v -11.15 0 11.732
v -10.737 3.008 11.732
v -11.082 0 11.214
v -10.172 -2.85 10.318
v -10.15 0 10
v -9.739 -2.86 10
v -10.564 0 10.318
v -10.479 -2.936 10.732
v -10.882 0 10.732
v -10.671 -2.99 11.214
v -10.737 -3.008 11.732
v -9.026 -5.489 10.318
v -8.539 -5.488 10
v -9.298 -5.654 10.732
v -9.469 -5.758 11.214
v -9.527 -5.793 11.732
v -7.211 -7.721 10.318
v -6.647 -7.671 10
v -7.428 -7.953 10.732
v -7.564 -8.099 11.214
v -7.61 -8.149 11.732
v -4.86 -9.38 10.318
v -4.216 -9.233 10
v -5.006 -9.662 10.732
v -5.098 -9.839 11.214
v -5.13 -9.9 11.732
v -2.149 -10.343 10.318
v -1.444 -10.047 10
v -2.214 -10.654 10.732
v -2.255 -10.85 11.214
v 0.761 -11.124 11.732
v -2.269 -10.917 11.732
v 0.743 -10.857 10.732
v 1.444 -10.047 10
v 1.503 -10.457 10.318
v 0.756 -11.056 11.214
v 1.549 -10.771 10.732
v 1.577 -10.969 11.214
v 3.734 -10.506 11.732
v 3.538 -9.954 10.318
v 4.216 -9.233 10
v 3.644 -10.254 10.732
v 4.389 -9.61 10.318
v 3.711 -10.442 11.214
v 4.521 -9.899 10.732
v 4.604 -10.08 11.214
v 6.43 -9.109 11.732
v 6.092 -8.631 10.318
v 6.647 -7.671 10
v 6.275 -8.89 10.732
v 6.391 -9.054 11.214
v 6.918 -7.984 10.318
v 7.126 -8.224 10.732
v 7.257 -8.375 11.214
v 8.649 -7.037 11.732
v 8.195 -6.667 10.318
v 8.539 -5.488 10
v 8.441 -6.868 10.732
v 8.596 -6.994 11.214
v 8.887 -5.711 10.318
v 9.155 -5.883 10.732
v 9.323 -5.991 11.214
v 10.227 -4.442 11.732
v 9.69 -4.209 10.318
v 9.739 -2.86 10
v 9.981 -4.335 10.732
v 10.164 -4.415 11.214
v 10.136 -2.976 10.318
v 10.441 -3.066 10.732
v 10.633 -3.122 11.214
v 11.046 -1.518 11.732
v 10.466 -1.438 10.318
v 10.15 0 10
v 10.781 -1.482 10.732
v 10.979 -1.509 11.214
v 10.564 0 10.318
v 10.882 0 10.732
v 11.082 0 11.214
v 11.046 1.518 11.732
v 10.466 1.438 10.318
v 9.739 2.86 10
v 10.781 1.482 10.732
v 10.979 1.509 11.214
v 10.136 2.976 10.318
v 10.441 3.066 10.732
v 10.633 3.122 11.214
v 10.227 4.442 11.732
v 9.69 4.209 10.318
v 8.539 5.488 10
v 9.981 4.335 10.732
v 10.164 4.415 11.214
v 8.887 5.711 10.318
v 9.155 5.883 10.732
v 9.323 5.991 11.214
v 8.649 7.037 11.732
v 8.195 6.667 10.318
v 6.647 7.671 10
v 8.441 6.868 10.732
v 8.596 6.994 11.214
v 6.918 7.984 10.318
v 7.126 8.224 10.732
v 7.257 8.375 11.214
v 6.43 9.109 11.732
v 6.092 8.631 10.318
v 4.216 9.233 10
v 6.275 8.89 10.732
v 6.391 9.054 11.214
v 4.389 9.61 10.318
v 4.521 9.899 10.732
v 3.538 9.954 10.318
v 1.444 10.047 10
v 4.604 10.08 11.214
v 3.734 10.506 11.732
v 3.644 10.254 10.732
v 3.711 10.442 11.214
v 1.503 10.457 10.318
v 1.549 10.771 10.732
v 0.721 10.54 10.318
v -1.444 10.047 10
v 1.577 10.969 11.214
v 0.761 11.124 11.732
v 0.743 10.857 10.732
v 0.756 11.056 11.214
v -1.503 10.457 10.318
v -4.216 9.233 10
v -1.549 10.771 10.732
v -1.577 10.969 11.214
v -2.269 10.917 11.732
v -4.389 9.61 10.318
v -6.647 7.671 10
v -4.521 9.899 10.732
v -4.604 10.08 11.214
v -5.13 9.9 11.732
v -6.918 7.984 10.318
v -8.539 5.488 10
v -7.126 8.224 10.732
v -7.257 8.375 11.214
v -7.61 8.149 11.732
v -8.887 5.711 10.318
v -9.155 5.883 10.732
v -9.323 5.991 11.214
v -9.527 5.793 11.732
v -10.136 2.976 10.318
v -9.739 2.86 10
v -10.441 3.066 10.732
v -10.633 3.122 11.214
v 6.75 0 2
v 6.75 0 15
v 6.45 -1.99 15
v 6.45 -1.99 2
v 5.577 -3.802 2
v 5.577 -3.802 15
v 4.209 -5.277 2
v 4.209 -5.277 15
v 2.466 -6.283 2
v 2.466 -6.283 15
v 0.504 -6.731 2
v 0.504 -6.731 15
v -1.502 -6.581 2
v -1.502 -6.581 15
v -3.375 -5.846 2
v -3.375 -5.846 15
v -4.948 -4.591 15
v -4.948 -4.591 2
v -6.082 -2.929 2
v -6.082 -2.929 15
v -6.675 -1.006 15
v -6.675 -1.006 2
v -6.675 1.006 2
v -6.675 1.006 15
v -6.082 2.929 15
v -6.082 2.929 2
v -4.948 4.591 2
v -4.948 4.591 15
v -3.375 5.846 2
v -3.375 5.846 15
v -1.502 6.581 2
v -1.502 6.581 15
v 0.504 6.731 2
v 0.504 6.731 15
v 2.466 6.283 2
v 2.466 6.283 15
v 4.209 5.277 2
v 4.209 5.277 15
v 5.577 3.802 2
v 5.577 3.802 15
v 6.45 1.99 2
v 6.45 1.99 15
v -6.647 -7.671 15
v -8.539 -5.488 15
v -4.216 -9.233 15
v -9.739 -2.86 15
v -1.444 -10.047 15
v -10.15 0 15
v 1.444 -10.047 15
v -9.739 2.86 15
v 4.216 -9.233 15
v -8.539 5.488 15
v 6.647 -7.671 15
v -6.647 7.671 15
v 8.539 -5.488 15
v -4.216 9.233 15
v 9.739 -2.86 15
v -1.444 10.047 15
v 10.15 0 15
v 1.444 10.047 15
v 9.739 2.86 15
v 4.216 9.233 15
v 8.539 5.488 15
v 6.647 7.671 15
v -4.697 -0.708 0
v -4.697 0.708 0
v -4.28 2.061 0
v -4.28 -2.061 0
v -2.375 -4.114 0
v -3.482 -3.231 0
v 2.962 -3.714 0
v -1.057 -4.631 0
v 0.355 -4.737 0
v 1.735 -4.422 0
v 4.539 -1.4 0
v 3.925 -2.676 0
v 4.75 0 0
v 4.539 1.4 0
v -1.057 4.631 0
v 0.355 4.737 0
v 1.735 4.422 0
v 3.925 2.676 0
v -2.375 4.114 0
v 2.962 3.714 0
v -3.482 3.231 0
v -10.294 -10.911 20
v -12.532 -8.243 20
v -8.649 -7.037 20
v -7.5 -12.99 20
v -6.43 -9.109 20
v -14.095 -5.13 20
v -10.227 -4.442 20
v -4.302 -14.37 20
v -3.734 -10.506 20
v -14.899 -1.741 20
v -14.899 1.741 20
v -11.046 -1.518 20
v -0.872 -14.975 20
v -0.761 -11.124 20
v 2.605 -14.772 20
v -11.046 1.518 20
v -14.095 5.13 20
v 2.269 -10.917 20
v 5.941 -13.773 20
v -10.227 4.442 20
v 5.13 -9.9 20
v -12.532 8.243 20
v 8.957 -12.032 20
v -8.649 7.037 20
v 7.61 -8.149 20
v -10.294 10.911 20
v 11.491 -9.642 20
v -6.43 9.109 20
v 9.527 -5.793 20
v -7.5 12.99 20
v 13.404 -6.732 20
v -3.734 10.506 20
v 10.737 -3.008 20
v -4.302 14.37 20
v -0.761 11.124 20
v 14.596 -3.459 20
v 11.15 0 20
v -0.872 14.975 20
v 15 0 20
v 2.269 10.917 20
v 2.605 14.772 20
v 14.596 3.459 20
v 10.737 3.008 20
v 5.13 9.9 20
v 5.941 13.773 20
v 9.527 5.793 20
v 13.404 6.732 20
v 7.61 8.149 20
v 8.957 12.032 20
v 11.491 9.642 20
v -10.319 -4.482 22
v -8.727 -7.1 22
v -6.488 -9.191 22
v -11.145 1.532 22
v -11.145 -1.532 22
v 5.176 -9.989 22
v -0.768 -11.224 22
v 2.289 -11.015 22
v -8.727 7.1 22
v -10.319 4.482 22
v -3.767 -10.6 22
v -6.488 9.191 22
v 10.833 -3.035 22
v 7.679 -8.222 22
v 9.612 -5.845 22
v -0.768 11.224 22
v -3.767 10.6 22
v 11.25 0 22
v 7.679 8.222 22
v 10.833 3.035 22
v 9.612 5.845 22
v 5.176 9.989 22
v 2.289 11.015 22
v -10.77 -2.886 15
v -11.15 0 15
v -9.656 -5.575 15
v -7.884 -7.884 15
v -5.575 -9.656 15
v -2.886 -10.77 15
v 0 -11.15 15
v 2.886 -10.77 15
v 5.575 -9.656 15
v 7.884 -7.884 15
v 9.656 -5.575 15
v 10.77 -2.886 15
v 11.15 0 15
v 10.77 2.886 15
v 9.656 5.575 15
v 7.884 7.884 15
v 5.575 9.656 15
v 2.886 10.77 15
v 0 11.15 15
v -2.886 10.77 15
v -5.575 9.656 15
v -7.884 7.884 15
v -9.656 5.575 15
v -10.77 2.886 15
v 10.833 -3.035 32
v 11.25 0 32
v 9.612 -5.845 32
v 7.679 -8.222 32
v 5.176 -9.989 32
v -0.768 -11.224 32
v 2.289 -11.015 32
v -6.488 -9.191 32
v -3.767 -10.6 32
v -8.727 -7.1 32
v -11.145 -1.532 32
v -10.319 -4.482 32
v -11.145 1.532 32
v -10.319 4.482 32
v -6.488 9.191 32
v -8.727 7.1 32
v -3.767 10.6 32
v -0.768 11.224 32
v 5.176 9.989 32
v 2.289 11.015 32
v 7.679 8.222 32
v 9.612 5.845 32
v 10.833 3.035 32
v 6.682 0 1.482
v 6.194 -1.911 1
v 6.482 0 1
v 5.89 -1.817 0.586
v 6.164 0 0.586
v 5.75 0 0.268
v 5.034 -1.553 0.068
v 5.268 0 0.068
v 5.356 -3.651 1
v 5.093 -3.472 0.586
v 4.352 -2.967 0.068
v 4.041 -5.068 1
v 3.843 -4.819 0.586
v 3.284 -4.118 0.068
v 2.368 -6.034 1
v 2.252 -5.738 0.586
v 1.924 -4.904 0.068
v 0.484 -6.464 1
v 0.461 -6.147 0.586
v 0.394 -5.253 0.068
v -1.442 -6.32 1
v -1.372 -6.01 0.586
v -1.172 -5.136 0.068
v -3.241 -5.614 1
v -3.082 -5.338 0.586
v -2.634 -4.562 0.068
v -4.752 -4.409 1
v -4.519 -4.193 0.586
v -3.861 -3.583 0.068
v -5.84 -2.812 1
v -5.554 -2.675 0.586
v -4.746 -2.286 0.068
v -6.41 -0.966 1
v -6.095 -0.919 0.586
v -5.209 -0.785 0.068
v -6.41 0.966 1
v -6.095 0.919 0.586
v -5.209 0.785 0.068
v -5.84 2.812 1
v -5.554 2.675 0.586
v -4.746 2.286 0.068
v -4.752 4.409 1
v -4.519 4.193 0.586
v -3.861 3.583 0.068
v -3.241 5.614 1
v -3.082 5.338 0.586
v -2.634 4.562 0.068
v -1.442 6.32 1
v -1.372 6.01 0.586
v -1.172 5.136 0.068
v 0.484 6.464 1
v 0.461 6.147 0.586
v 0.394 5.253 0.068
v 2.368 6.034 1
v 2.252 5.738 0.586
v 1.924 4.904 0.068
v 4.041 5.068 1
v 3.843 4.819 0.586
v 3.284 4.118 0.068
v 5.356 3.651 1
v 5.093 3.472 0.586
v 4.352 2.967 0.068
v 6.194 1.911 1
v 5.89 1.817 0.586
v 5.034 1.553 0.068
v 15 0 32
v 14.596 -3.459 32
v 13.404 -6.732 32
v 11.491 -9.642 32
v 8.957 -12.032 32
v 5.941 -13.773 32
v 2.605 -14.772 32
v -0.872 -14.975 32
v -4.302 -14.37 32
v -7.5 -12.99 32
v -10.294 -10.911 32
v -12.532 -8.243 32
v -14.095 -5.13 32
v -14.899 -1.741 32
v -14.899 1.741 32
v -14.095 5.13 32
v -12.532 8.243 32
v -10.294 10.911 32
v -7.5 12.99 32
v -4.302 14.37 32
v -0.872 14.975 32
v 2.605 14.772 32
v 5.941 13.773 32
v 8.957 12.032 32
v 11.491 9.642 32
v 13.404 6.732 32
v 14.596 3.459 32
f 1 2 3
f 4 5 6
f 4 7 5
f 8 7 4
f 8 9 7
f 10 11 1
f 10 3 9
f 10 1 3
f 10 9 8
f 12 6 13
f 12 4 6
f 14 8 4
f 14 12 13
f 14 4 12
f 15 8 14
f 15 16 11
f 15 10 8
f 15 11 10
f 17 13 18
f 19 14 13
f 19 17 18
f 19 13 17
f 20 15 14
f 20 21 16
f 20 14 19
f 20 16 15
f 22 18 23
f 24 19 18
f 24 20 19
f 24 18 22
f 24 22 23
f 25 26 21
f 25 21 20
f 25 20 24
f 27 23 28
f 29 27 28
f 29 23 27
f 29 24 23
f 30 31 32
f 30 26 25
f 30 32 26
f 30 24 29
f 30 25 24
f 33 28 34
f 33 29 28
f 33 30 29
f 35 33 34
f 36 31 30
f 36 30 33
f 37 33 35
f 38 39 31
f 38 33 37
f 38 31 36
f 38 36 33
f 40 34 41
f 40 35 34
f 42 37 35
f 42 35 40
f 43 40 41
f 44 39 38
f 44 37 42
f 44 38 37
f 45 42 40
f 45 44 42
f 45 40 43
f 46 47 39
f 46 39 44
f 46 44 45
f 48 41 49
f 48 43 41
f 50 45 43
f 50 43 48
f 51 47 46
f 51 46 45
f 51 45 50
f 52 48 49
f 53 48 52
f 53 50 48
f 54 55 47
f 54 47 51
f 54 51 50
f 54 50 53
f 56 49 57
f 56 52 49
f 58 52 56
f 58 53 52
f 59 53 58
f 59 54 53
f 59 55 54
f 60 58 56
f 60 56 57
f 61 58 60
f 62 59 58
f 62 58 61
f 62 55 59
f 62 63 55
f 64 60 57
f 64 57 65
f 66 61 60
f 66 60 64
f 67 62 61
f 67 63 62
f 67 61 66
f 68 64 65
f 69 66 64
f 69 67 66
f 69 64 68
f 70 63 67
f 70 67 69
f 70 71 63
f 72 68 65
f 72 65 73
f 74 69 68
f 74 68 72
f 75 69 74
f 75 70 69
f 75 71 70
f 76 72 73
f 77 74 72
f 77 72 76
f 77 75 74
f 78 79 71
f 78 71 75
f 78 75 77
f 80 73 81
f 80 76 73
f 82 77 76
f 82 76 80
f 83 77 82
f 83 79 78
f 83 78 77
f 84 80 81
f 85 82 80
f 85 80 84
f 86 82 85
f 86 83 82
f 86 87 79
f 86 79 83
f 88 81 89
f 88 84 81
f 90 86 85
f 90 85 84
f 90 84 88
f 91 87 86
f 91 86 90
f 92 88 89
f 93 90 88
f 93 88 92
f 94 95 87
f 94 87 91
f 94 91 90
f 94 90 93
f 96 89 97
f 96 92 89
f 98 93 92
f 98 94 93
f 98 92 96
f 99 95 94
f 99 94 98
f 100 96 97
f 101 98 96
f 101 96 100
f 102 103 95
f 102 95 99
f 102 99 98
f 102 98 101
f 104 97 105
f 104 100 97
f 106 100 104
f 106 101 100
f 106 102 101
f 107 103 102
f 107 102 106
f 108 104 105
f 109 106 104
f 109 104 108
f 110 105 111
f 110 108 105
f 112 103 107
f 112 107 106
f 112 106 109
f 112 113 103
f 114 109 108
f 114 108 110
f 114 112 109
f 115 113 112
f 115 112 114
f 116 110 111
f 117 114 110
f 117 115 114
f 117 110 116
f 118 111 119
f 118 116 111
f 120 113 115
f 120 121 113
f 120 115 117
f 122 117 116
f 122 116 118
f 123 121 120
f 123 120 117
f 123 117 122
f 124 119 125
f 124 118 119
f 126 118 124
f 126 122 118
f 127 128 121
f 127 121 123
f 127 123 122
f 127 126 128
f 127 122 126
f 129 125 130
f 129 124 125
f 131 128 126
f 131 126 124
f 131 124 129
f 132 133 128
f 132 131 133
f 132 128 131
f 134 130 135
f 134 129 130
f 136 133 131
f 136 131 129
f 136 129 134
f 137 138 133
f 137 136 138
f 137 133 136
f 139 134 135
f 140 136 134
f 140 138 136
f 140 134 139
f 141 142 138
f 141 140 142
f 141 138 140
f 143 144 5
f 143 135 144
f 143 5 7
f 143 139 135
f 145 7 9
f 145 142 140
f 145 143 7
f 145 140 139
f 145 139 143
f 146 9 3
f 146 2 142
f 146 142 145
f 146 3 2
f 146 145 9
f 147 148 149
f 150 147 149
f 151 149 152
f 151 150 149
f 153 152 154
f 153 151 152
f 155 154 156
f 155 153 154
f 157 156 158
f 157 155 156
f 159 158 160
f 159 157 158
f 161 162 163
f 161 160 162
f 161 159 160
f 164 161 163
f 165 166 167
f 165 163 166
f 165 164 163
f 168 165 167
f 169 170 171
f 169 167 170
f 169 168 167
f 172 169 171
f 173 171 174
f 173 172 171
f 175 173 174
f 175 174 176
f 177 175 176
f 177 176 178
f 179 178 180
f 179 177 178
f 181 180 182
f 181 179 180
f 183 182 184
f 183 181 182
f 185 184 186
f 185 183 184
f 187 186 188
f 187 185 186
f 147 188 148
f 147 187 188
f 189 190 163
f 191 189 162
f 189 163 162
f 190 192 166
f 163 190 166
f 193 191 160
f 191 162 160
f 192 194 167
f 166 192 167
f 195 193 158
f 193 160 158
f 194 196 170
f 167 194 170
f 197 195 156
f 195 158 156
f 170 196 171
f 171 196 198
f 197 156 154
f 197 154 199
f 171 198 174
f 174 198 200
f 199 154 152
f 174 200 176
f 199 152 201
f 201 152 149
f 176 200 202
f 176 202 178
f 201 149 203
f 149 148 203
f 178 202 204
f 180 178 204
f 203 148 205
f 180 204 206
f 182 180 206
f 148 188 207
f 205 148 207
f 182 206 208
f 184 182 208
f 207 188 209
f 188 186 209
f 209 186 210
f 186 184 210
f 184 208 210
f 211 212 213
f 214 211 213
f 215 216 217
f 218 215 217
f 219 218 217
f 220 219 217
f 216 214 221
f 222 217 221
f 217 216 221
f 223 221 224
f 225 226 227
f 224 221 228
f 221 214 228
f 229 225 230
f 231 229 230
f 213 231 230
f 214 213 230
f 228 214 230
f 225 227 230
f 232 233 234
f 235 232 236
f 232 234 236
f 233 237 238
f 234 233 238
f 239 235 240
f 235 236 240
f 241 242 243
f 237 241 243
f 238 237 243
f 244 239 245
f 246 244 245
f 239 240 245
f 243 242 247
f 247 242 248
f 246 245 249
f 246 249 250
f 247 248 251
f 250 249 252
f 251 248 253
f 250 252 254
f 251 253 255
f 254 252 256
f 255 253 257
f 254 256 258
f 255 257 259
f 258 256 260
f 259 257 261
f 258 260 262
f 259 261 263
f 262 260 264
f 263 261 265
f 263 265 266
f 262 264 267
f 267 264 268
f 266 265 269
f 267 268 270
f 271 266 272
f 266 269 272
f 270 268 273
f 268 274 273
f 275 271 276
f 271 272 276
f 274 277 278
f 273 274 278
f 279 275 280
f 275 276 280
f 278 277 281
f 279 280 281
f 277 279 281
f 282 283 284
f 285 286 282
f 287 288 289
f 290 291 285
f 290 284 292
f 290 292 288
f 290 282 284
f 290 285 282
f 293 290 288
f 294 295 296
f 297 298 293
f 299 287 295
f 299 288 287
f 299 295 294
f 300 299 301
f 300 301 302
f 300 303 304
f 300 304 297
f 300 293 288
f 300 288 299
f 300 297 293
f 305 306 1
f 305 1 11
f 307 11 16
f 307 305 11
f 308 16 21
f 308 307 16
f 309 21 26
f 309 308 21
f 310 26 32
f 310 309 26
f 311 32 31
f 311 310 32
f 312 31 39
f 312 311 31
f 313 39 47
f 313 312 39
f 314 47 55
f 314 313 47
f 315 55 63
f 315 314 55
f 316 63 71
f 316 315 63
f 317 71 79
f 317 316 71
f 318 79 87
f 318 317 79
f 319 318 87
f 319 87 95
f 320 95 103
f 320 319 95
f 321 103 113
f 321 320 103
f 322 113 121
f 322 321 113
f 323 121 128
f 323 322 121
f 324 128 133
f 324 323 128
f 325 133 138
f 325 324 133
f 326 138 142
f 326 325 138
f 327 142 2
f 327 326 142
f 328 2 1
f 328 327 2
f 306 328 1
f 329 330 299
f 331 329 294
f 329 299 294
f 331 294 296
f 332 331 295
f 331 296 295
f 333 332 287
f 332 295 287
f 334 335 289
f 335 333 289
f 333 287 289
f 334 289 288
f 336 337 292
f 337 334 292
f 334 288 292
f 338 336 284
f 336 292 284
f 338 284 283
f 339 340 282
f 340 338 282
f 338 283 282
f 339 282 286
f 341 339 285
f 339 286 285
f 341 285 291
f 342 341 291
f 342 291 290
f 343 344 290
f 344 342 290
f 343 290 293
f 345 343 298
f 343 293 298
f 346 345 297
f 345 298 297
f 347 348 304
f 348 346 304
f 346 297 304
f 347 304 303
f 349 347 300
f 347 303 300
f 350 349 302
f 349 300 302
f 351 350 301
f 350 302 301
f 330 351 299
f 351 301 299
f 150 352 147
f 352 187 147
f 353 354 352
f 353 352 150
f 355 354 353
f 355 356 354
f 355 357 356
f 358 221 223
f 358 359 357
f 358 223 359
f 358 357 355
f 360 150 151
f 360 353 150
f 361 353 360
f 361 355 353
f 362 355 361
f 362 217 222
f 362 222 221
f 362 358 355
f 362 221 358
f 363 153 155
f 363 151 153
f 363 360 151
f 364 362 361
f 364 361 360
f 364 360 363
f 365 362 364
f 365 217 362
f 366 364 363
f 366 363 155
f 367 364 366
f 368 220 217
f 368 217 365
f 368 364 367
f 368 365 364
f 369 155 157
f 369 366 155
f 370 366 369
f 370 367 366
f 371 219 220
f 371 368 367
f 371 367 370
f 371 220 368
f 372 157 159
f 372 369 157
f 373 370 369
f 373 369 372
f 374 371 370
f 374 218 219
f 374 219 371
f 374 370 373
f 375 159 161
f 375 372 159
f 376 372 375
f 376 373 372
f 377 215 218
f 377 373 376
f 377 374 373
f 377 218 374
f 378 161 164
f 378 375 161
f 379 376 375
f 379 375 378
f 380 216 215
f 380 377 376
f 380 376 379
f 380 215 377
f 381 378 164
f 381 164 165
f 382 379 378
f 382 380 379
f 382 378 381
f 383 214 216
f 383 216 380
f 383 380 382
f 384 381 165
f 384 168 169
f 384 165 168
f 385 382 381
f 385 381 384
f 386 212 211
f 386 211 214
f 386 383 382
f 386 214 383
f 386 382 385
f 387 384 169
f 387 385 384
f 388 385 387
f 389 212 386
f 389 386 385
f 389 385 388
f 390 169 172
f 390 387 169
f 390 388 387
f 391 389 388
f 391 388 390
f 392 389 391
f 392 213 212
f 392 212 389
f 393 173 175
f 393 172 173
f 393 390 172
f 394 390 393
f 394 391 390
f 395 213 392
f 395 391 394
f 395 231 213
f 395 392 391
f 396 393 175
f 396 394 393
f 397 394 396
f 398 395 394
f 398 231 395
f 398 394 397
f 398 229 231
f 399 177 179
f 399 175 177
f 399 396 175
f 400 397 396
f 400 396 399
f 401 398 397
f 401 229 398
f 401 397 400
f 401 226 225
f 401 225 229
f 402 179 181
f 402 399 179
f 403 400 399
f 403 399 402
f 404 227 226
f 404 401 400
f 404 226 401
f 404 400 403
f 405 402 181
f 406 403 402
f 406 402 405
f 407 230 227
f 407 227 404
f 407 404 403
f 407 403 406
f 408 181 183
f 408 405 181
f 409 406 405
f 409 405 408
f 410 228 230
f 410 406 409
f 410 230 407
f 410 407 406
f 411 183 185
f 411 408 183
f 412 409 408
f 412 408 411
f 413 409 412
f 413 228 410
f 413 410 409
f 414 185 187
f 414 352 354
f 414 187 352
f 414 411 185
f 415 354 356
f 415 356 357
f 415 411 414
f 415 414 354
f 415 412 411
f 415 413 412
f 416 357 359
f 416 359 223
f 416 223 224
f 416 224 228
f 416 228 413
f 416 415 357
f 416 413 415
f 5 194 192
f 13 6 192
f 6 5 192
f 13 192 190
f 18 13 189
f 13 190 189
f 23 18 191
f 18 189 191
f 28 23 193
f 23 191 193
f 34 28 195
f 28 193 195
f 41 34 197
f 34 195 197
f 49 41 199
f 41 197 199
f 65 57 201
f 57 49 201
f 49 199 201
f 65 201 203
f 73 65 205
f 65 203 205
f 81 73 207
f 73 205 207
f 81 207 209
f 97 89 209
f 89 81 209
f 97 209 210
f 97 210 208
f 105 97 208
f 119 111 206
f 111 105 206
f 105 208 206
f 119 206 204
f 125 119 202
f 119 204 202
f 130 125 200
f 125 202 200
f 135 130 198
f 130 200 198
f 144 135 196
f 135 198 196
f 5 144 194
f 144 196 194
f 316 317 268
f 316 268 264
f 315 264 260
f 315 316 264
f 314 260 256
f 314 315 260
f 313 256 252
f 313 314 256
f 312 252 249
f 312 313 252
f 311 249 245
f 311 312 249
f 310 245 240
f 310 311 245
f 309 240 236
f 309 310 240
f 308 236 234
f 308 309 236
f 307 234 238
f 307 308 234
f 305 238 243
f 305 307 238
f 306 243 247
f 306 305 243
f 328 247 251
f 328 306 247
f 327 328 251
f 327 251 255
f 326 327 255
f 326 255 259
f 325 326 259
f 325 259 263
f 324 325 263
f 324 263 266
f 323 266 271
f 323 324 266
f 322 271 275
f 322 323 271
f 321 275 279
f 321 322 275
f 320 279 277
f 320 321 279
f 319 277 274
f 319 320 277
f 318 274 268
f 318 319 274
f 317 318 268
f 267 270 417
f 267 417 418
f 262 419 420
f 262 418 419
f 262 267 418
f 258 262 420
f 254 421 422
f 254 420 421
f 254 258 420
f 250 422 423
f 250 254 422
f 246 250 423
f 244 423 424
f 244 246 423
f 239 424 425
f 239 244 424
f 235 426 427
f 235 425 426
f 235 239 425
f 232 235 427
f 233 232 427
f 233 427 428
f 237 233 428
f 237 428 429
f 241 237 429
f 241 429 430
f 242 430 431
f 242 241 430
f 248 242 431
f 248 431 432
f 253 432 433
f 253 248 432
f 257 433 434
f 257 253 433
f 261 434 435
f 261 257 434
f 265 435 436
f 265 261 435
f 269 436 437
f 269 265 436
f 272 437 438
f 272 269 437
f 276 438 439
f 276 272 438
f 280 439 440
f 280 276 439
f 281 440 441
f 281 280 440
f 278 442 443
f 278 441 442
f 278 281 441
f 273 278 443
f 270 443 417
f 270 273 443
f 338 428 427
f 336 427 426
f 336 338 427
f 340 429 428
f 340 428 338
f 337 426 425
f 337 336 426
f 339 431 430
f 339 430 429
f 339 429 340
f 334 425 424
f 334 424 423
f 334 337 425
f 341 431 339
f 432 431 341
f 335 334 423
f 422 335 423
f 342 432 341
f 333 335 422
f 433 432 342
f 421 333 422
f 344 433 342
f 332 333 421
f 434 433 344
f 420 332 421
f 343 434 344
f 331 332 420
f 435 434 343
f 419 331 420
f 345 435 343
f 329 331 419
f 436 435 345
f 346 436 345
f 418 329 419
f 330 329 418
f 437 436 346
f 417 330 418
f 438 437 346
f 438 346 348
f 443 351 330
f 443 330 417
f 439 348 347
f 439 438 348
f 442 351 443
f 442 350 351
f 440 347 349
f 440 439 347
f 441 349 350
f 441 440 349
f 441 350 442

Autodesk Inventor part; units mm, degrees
ref_plane "YZ Plane" through (0, 0, 0) normal (1, 0, 0) x (0, 1, 0)
ref_plane "XZ Plane" through (0, 0, 0) normal (0, 1, 0) x (-1, 0, 0)
ref_plane "XY Plane" through (0, 0, 0) normal (0, 0, 1) x (1, 0, 0)
sketch "Sketch1" plane through (0, 0, 0) normal (0, 0, 1) x (1, 0, 0)
  circle A0 centre (0, 0) radius 6.75
  dimension "d0" = 13.5
extrude "Extrusion1" add sketch "Sketch1" along normal blind 15
sketch "Sketch2" plane through (0, 0, 15) normal (0, 0, 1) x (1, 0, 0)
  circle A0 centre (0, 0) radius 11.15
  circle A1 centre (0, 0) radius 12.75
  dimension "d3" = 22.3
  dimension "d19" = 25.5
extrude "Extrusion3" add sketch "Sketch2" along normal blind 5 contours A0
sketch "Sketch3" plane through (0, 0, 15) normal (0, 0, -1) x (-1, 0, 0)
  circle A0 centre (0, 0) radius 10.15
  circle A1 centre (0, 0) radius 11.15
  dimension "d8" = 20.3
  dimension "d9" = 22.3
extrude "Extrusion4" add sketch "Sketch3" along normal blind 5
sketch "Sketch4" plane through (0, 0, 20) normal (0, 0, 1) x (1, 0, 0)
  circle A0 centre (0, 0) radius 14.25
  dimension "d12" = 28.5
extrude "Extrusion5" [suppressed]
fillet "Fillet1" [suppressed]
fillet "Fillet2" radius 2 1 edges at (-6.75, 0, 0)
fillet "Fillet3" radius 2 1 edges at (11.15, 0, 10)
fillet "Fillet4" [suppressed]
sketch "Sketch7" plane through (0, 0, 20) normal (0, 0, 1) x (1, 0, 0)
  circle A0 centre (0, 0) radius 15
  dimension "d20" = 30
extrude "Extrusion6" add sketch "Sketch7" along normal blind 2
sketch "Sketch8" plane through (0, 0, 22) normal (0, 0, 1) x (1, 0, 0)
  circle A0 centre (0, 0) radius 11.25
  circle A1 centre (0, 0) radius 15
  dimension "d23" = 22.5
  dimension "d24" = 30
extrude "Extrusion7" add sketch "Sketch8" along normal blind 10
properties part number "Elbow_Parallel_Rod_V1"
